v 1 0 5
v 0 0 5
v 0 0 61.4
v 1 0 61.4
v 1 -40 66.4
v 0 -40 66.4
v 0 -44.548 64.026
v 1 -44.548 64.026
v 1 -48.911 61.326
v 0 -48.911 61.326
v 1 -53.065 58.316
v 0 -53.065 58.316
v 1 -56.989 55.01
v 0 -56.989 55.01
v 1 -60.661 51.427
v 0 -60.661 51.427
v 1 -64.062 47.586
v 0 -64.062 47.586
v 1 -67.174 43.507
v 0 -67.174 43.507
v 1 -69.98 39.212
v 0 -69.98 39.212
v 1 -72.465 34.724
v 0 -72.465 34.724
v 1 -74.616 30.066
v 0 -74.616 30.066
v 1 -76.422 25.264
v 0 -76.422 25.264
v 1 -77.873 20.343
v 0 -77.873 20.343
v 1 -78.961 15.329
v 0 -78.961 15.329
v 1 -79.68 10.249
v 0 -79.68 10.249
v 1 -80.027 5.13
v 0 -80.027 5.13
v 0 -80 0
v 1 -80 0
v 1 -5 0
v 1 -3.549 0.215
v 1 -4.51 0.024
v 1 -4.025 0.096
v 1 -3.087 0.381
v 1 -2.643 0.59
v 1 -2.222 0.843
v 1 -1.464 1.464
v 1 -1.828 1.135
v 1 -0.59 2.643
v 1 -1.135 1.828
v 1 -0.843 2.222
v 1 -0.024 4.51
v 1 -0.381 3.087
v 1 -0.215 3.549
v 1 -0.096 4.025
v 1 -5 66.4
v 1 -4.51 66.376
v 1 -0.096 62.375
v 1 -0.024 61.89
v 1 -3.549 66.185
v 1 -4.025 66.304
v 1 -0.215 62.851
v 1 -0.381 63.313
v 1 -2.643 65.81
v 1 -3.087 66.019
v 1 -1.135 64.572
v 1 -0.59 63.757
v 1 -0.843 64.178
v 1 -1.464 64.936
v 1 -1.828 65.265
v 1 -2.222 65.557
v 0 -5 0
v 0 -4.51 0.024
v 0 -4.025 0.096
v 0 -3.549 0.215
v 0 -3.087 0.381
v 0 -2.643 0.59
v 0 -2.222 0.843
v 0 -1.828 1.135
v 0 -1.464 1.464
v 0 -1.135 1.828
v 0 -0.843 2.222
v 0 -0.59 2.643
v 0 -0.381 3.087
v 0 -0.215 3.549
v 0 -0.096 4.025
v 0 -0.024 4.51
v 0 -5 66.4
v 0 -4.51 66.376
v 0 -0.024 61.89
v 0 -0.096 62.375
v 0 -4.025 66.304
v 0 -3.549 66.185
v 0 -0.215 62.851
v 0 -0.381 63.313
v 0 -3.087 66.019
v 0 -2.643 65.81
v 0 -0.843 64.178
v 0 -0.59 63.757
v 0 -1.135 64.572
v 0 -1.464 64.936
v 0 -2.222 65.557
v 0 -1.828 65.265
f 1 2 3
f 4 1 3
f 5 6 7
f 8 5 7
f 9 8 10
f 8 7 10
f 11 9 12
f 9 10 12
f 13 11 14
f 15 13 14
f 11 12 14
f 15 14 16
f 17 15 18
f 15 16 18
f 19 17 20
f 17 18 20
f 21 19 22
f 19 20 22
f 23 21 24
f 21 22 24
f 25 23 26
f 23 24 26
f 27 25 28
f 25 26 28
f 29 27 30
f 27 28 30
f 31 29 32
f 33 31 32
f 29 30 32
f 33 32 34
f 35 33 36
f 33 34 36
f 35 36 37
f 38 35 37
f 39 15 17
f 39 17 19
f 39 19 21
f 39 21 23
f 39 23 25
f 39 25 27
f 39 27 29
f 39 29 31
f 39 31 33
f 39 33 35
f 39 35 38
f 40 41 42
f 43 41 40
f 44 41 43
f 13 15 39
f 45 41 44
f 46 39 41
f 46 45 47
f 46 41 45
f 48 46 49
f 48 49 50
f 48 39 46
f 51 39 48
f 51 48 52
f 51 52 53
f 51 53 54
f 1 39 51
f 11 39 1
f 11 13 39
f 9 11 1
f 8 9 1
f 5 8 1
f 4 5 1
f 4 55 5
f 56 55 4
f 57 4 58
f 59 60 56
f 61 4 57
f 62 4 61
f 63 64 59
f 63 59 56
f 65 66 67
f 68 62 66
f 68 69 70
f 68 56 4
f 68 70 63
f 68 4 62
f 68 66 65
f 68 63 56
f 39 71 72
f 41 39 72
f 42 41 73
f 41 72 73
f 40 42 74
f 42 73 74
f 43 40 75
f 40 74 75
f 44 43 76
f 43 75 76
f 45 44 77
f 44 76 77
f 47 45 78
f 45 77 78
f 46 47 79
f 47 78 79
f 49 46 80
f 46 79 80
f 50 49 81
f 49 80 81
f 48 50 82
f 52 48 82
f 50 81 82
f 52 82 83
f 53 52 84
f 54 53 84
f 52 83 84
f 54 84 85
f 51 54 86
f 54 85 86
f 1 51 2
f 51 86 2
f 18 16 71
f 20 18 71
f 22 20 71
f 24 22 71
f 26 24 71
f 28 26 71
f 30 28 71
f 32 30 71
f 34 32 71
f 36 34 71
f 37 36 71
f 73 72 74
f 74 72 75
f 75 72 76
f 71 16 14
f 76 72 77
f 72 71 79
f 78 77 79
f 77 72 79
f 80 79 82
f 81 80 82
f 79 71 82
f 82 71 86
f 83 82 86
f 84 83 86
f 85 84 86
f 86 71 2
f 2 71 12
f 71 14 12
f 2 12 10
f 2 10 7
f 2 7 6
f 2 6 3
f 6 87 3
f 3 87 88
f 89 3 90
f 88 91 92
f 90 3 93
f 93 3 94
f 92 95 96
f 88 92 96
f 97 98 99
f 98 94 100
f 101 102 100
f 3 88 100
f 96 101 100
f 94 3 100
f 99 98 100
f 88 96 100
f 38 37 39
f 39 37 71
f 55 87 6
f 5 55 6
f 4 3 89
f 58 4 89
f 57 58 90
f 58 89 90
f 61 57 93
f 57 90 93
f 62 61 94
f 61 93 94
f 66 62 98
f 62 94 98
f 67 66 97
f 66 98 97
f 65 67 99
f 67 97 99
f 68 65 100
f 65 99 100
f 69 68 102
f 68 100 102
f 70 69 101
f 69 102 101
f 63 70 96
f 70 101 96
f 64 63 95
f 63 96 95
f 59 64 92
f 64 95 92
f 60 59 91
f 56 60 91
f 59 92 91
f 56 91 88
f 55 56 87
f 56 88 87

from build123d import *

# Parameters (mm, degrees)
F1_DEPTH = 1


with BuildPart() as f1:
    # F0 (on Right) → F1 (new body)
    with BuildSketch(Plane.YZ):
        with BuildLine():
            Line((-80, 0), (-5, 0))
            ThreePointArc((-5, 0), (-1.464466, 1.464466), (0, 5))
            Line((0, 5), (0, 61.4))
            ThreePointArc((0, 61.4), (-1.464466, 64.935534), (-5, 66.4))
            Line((-5, 66.4), (-40, 66.4))
            ThreePointArc((-40, 66.4), (-69.979813, 39.211936), (-80, 0))
        make_face()
    extrude(amount=F1_DEPTH)


solid = f1.part
